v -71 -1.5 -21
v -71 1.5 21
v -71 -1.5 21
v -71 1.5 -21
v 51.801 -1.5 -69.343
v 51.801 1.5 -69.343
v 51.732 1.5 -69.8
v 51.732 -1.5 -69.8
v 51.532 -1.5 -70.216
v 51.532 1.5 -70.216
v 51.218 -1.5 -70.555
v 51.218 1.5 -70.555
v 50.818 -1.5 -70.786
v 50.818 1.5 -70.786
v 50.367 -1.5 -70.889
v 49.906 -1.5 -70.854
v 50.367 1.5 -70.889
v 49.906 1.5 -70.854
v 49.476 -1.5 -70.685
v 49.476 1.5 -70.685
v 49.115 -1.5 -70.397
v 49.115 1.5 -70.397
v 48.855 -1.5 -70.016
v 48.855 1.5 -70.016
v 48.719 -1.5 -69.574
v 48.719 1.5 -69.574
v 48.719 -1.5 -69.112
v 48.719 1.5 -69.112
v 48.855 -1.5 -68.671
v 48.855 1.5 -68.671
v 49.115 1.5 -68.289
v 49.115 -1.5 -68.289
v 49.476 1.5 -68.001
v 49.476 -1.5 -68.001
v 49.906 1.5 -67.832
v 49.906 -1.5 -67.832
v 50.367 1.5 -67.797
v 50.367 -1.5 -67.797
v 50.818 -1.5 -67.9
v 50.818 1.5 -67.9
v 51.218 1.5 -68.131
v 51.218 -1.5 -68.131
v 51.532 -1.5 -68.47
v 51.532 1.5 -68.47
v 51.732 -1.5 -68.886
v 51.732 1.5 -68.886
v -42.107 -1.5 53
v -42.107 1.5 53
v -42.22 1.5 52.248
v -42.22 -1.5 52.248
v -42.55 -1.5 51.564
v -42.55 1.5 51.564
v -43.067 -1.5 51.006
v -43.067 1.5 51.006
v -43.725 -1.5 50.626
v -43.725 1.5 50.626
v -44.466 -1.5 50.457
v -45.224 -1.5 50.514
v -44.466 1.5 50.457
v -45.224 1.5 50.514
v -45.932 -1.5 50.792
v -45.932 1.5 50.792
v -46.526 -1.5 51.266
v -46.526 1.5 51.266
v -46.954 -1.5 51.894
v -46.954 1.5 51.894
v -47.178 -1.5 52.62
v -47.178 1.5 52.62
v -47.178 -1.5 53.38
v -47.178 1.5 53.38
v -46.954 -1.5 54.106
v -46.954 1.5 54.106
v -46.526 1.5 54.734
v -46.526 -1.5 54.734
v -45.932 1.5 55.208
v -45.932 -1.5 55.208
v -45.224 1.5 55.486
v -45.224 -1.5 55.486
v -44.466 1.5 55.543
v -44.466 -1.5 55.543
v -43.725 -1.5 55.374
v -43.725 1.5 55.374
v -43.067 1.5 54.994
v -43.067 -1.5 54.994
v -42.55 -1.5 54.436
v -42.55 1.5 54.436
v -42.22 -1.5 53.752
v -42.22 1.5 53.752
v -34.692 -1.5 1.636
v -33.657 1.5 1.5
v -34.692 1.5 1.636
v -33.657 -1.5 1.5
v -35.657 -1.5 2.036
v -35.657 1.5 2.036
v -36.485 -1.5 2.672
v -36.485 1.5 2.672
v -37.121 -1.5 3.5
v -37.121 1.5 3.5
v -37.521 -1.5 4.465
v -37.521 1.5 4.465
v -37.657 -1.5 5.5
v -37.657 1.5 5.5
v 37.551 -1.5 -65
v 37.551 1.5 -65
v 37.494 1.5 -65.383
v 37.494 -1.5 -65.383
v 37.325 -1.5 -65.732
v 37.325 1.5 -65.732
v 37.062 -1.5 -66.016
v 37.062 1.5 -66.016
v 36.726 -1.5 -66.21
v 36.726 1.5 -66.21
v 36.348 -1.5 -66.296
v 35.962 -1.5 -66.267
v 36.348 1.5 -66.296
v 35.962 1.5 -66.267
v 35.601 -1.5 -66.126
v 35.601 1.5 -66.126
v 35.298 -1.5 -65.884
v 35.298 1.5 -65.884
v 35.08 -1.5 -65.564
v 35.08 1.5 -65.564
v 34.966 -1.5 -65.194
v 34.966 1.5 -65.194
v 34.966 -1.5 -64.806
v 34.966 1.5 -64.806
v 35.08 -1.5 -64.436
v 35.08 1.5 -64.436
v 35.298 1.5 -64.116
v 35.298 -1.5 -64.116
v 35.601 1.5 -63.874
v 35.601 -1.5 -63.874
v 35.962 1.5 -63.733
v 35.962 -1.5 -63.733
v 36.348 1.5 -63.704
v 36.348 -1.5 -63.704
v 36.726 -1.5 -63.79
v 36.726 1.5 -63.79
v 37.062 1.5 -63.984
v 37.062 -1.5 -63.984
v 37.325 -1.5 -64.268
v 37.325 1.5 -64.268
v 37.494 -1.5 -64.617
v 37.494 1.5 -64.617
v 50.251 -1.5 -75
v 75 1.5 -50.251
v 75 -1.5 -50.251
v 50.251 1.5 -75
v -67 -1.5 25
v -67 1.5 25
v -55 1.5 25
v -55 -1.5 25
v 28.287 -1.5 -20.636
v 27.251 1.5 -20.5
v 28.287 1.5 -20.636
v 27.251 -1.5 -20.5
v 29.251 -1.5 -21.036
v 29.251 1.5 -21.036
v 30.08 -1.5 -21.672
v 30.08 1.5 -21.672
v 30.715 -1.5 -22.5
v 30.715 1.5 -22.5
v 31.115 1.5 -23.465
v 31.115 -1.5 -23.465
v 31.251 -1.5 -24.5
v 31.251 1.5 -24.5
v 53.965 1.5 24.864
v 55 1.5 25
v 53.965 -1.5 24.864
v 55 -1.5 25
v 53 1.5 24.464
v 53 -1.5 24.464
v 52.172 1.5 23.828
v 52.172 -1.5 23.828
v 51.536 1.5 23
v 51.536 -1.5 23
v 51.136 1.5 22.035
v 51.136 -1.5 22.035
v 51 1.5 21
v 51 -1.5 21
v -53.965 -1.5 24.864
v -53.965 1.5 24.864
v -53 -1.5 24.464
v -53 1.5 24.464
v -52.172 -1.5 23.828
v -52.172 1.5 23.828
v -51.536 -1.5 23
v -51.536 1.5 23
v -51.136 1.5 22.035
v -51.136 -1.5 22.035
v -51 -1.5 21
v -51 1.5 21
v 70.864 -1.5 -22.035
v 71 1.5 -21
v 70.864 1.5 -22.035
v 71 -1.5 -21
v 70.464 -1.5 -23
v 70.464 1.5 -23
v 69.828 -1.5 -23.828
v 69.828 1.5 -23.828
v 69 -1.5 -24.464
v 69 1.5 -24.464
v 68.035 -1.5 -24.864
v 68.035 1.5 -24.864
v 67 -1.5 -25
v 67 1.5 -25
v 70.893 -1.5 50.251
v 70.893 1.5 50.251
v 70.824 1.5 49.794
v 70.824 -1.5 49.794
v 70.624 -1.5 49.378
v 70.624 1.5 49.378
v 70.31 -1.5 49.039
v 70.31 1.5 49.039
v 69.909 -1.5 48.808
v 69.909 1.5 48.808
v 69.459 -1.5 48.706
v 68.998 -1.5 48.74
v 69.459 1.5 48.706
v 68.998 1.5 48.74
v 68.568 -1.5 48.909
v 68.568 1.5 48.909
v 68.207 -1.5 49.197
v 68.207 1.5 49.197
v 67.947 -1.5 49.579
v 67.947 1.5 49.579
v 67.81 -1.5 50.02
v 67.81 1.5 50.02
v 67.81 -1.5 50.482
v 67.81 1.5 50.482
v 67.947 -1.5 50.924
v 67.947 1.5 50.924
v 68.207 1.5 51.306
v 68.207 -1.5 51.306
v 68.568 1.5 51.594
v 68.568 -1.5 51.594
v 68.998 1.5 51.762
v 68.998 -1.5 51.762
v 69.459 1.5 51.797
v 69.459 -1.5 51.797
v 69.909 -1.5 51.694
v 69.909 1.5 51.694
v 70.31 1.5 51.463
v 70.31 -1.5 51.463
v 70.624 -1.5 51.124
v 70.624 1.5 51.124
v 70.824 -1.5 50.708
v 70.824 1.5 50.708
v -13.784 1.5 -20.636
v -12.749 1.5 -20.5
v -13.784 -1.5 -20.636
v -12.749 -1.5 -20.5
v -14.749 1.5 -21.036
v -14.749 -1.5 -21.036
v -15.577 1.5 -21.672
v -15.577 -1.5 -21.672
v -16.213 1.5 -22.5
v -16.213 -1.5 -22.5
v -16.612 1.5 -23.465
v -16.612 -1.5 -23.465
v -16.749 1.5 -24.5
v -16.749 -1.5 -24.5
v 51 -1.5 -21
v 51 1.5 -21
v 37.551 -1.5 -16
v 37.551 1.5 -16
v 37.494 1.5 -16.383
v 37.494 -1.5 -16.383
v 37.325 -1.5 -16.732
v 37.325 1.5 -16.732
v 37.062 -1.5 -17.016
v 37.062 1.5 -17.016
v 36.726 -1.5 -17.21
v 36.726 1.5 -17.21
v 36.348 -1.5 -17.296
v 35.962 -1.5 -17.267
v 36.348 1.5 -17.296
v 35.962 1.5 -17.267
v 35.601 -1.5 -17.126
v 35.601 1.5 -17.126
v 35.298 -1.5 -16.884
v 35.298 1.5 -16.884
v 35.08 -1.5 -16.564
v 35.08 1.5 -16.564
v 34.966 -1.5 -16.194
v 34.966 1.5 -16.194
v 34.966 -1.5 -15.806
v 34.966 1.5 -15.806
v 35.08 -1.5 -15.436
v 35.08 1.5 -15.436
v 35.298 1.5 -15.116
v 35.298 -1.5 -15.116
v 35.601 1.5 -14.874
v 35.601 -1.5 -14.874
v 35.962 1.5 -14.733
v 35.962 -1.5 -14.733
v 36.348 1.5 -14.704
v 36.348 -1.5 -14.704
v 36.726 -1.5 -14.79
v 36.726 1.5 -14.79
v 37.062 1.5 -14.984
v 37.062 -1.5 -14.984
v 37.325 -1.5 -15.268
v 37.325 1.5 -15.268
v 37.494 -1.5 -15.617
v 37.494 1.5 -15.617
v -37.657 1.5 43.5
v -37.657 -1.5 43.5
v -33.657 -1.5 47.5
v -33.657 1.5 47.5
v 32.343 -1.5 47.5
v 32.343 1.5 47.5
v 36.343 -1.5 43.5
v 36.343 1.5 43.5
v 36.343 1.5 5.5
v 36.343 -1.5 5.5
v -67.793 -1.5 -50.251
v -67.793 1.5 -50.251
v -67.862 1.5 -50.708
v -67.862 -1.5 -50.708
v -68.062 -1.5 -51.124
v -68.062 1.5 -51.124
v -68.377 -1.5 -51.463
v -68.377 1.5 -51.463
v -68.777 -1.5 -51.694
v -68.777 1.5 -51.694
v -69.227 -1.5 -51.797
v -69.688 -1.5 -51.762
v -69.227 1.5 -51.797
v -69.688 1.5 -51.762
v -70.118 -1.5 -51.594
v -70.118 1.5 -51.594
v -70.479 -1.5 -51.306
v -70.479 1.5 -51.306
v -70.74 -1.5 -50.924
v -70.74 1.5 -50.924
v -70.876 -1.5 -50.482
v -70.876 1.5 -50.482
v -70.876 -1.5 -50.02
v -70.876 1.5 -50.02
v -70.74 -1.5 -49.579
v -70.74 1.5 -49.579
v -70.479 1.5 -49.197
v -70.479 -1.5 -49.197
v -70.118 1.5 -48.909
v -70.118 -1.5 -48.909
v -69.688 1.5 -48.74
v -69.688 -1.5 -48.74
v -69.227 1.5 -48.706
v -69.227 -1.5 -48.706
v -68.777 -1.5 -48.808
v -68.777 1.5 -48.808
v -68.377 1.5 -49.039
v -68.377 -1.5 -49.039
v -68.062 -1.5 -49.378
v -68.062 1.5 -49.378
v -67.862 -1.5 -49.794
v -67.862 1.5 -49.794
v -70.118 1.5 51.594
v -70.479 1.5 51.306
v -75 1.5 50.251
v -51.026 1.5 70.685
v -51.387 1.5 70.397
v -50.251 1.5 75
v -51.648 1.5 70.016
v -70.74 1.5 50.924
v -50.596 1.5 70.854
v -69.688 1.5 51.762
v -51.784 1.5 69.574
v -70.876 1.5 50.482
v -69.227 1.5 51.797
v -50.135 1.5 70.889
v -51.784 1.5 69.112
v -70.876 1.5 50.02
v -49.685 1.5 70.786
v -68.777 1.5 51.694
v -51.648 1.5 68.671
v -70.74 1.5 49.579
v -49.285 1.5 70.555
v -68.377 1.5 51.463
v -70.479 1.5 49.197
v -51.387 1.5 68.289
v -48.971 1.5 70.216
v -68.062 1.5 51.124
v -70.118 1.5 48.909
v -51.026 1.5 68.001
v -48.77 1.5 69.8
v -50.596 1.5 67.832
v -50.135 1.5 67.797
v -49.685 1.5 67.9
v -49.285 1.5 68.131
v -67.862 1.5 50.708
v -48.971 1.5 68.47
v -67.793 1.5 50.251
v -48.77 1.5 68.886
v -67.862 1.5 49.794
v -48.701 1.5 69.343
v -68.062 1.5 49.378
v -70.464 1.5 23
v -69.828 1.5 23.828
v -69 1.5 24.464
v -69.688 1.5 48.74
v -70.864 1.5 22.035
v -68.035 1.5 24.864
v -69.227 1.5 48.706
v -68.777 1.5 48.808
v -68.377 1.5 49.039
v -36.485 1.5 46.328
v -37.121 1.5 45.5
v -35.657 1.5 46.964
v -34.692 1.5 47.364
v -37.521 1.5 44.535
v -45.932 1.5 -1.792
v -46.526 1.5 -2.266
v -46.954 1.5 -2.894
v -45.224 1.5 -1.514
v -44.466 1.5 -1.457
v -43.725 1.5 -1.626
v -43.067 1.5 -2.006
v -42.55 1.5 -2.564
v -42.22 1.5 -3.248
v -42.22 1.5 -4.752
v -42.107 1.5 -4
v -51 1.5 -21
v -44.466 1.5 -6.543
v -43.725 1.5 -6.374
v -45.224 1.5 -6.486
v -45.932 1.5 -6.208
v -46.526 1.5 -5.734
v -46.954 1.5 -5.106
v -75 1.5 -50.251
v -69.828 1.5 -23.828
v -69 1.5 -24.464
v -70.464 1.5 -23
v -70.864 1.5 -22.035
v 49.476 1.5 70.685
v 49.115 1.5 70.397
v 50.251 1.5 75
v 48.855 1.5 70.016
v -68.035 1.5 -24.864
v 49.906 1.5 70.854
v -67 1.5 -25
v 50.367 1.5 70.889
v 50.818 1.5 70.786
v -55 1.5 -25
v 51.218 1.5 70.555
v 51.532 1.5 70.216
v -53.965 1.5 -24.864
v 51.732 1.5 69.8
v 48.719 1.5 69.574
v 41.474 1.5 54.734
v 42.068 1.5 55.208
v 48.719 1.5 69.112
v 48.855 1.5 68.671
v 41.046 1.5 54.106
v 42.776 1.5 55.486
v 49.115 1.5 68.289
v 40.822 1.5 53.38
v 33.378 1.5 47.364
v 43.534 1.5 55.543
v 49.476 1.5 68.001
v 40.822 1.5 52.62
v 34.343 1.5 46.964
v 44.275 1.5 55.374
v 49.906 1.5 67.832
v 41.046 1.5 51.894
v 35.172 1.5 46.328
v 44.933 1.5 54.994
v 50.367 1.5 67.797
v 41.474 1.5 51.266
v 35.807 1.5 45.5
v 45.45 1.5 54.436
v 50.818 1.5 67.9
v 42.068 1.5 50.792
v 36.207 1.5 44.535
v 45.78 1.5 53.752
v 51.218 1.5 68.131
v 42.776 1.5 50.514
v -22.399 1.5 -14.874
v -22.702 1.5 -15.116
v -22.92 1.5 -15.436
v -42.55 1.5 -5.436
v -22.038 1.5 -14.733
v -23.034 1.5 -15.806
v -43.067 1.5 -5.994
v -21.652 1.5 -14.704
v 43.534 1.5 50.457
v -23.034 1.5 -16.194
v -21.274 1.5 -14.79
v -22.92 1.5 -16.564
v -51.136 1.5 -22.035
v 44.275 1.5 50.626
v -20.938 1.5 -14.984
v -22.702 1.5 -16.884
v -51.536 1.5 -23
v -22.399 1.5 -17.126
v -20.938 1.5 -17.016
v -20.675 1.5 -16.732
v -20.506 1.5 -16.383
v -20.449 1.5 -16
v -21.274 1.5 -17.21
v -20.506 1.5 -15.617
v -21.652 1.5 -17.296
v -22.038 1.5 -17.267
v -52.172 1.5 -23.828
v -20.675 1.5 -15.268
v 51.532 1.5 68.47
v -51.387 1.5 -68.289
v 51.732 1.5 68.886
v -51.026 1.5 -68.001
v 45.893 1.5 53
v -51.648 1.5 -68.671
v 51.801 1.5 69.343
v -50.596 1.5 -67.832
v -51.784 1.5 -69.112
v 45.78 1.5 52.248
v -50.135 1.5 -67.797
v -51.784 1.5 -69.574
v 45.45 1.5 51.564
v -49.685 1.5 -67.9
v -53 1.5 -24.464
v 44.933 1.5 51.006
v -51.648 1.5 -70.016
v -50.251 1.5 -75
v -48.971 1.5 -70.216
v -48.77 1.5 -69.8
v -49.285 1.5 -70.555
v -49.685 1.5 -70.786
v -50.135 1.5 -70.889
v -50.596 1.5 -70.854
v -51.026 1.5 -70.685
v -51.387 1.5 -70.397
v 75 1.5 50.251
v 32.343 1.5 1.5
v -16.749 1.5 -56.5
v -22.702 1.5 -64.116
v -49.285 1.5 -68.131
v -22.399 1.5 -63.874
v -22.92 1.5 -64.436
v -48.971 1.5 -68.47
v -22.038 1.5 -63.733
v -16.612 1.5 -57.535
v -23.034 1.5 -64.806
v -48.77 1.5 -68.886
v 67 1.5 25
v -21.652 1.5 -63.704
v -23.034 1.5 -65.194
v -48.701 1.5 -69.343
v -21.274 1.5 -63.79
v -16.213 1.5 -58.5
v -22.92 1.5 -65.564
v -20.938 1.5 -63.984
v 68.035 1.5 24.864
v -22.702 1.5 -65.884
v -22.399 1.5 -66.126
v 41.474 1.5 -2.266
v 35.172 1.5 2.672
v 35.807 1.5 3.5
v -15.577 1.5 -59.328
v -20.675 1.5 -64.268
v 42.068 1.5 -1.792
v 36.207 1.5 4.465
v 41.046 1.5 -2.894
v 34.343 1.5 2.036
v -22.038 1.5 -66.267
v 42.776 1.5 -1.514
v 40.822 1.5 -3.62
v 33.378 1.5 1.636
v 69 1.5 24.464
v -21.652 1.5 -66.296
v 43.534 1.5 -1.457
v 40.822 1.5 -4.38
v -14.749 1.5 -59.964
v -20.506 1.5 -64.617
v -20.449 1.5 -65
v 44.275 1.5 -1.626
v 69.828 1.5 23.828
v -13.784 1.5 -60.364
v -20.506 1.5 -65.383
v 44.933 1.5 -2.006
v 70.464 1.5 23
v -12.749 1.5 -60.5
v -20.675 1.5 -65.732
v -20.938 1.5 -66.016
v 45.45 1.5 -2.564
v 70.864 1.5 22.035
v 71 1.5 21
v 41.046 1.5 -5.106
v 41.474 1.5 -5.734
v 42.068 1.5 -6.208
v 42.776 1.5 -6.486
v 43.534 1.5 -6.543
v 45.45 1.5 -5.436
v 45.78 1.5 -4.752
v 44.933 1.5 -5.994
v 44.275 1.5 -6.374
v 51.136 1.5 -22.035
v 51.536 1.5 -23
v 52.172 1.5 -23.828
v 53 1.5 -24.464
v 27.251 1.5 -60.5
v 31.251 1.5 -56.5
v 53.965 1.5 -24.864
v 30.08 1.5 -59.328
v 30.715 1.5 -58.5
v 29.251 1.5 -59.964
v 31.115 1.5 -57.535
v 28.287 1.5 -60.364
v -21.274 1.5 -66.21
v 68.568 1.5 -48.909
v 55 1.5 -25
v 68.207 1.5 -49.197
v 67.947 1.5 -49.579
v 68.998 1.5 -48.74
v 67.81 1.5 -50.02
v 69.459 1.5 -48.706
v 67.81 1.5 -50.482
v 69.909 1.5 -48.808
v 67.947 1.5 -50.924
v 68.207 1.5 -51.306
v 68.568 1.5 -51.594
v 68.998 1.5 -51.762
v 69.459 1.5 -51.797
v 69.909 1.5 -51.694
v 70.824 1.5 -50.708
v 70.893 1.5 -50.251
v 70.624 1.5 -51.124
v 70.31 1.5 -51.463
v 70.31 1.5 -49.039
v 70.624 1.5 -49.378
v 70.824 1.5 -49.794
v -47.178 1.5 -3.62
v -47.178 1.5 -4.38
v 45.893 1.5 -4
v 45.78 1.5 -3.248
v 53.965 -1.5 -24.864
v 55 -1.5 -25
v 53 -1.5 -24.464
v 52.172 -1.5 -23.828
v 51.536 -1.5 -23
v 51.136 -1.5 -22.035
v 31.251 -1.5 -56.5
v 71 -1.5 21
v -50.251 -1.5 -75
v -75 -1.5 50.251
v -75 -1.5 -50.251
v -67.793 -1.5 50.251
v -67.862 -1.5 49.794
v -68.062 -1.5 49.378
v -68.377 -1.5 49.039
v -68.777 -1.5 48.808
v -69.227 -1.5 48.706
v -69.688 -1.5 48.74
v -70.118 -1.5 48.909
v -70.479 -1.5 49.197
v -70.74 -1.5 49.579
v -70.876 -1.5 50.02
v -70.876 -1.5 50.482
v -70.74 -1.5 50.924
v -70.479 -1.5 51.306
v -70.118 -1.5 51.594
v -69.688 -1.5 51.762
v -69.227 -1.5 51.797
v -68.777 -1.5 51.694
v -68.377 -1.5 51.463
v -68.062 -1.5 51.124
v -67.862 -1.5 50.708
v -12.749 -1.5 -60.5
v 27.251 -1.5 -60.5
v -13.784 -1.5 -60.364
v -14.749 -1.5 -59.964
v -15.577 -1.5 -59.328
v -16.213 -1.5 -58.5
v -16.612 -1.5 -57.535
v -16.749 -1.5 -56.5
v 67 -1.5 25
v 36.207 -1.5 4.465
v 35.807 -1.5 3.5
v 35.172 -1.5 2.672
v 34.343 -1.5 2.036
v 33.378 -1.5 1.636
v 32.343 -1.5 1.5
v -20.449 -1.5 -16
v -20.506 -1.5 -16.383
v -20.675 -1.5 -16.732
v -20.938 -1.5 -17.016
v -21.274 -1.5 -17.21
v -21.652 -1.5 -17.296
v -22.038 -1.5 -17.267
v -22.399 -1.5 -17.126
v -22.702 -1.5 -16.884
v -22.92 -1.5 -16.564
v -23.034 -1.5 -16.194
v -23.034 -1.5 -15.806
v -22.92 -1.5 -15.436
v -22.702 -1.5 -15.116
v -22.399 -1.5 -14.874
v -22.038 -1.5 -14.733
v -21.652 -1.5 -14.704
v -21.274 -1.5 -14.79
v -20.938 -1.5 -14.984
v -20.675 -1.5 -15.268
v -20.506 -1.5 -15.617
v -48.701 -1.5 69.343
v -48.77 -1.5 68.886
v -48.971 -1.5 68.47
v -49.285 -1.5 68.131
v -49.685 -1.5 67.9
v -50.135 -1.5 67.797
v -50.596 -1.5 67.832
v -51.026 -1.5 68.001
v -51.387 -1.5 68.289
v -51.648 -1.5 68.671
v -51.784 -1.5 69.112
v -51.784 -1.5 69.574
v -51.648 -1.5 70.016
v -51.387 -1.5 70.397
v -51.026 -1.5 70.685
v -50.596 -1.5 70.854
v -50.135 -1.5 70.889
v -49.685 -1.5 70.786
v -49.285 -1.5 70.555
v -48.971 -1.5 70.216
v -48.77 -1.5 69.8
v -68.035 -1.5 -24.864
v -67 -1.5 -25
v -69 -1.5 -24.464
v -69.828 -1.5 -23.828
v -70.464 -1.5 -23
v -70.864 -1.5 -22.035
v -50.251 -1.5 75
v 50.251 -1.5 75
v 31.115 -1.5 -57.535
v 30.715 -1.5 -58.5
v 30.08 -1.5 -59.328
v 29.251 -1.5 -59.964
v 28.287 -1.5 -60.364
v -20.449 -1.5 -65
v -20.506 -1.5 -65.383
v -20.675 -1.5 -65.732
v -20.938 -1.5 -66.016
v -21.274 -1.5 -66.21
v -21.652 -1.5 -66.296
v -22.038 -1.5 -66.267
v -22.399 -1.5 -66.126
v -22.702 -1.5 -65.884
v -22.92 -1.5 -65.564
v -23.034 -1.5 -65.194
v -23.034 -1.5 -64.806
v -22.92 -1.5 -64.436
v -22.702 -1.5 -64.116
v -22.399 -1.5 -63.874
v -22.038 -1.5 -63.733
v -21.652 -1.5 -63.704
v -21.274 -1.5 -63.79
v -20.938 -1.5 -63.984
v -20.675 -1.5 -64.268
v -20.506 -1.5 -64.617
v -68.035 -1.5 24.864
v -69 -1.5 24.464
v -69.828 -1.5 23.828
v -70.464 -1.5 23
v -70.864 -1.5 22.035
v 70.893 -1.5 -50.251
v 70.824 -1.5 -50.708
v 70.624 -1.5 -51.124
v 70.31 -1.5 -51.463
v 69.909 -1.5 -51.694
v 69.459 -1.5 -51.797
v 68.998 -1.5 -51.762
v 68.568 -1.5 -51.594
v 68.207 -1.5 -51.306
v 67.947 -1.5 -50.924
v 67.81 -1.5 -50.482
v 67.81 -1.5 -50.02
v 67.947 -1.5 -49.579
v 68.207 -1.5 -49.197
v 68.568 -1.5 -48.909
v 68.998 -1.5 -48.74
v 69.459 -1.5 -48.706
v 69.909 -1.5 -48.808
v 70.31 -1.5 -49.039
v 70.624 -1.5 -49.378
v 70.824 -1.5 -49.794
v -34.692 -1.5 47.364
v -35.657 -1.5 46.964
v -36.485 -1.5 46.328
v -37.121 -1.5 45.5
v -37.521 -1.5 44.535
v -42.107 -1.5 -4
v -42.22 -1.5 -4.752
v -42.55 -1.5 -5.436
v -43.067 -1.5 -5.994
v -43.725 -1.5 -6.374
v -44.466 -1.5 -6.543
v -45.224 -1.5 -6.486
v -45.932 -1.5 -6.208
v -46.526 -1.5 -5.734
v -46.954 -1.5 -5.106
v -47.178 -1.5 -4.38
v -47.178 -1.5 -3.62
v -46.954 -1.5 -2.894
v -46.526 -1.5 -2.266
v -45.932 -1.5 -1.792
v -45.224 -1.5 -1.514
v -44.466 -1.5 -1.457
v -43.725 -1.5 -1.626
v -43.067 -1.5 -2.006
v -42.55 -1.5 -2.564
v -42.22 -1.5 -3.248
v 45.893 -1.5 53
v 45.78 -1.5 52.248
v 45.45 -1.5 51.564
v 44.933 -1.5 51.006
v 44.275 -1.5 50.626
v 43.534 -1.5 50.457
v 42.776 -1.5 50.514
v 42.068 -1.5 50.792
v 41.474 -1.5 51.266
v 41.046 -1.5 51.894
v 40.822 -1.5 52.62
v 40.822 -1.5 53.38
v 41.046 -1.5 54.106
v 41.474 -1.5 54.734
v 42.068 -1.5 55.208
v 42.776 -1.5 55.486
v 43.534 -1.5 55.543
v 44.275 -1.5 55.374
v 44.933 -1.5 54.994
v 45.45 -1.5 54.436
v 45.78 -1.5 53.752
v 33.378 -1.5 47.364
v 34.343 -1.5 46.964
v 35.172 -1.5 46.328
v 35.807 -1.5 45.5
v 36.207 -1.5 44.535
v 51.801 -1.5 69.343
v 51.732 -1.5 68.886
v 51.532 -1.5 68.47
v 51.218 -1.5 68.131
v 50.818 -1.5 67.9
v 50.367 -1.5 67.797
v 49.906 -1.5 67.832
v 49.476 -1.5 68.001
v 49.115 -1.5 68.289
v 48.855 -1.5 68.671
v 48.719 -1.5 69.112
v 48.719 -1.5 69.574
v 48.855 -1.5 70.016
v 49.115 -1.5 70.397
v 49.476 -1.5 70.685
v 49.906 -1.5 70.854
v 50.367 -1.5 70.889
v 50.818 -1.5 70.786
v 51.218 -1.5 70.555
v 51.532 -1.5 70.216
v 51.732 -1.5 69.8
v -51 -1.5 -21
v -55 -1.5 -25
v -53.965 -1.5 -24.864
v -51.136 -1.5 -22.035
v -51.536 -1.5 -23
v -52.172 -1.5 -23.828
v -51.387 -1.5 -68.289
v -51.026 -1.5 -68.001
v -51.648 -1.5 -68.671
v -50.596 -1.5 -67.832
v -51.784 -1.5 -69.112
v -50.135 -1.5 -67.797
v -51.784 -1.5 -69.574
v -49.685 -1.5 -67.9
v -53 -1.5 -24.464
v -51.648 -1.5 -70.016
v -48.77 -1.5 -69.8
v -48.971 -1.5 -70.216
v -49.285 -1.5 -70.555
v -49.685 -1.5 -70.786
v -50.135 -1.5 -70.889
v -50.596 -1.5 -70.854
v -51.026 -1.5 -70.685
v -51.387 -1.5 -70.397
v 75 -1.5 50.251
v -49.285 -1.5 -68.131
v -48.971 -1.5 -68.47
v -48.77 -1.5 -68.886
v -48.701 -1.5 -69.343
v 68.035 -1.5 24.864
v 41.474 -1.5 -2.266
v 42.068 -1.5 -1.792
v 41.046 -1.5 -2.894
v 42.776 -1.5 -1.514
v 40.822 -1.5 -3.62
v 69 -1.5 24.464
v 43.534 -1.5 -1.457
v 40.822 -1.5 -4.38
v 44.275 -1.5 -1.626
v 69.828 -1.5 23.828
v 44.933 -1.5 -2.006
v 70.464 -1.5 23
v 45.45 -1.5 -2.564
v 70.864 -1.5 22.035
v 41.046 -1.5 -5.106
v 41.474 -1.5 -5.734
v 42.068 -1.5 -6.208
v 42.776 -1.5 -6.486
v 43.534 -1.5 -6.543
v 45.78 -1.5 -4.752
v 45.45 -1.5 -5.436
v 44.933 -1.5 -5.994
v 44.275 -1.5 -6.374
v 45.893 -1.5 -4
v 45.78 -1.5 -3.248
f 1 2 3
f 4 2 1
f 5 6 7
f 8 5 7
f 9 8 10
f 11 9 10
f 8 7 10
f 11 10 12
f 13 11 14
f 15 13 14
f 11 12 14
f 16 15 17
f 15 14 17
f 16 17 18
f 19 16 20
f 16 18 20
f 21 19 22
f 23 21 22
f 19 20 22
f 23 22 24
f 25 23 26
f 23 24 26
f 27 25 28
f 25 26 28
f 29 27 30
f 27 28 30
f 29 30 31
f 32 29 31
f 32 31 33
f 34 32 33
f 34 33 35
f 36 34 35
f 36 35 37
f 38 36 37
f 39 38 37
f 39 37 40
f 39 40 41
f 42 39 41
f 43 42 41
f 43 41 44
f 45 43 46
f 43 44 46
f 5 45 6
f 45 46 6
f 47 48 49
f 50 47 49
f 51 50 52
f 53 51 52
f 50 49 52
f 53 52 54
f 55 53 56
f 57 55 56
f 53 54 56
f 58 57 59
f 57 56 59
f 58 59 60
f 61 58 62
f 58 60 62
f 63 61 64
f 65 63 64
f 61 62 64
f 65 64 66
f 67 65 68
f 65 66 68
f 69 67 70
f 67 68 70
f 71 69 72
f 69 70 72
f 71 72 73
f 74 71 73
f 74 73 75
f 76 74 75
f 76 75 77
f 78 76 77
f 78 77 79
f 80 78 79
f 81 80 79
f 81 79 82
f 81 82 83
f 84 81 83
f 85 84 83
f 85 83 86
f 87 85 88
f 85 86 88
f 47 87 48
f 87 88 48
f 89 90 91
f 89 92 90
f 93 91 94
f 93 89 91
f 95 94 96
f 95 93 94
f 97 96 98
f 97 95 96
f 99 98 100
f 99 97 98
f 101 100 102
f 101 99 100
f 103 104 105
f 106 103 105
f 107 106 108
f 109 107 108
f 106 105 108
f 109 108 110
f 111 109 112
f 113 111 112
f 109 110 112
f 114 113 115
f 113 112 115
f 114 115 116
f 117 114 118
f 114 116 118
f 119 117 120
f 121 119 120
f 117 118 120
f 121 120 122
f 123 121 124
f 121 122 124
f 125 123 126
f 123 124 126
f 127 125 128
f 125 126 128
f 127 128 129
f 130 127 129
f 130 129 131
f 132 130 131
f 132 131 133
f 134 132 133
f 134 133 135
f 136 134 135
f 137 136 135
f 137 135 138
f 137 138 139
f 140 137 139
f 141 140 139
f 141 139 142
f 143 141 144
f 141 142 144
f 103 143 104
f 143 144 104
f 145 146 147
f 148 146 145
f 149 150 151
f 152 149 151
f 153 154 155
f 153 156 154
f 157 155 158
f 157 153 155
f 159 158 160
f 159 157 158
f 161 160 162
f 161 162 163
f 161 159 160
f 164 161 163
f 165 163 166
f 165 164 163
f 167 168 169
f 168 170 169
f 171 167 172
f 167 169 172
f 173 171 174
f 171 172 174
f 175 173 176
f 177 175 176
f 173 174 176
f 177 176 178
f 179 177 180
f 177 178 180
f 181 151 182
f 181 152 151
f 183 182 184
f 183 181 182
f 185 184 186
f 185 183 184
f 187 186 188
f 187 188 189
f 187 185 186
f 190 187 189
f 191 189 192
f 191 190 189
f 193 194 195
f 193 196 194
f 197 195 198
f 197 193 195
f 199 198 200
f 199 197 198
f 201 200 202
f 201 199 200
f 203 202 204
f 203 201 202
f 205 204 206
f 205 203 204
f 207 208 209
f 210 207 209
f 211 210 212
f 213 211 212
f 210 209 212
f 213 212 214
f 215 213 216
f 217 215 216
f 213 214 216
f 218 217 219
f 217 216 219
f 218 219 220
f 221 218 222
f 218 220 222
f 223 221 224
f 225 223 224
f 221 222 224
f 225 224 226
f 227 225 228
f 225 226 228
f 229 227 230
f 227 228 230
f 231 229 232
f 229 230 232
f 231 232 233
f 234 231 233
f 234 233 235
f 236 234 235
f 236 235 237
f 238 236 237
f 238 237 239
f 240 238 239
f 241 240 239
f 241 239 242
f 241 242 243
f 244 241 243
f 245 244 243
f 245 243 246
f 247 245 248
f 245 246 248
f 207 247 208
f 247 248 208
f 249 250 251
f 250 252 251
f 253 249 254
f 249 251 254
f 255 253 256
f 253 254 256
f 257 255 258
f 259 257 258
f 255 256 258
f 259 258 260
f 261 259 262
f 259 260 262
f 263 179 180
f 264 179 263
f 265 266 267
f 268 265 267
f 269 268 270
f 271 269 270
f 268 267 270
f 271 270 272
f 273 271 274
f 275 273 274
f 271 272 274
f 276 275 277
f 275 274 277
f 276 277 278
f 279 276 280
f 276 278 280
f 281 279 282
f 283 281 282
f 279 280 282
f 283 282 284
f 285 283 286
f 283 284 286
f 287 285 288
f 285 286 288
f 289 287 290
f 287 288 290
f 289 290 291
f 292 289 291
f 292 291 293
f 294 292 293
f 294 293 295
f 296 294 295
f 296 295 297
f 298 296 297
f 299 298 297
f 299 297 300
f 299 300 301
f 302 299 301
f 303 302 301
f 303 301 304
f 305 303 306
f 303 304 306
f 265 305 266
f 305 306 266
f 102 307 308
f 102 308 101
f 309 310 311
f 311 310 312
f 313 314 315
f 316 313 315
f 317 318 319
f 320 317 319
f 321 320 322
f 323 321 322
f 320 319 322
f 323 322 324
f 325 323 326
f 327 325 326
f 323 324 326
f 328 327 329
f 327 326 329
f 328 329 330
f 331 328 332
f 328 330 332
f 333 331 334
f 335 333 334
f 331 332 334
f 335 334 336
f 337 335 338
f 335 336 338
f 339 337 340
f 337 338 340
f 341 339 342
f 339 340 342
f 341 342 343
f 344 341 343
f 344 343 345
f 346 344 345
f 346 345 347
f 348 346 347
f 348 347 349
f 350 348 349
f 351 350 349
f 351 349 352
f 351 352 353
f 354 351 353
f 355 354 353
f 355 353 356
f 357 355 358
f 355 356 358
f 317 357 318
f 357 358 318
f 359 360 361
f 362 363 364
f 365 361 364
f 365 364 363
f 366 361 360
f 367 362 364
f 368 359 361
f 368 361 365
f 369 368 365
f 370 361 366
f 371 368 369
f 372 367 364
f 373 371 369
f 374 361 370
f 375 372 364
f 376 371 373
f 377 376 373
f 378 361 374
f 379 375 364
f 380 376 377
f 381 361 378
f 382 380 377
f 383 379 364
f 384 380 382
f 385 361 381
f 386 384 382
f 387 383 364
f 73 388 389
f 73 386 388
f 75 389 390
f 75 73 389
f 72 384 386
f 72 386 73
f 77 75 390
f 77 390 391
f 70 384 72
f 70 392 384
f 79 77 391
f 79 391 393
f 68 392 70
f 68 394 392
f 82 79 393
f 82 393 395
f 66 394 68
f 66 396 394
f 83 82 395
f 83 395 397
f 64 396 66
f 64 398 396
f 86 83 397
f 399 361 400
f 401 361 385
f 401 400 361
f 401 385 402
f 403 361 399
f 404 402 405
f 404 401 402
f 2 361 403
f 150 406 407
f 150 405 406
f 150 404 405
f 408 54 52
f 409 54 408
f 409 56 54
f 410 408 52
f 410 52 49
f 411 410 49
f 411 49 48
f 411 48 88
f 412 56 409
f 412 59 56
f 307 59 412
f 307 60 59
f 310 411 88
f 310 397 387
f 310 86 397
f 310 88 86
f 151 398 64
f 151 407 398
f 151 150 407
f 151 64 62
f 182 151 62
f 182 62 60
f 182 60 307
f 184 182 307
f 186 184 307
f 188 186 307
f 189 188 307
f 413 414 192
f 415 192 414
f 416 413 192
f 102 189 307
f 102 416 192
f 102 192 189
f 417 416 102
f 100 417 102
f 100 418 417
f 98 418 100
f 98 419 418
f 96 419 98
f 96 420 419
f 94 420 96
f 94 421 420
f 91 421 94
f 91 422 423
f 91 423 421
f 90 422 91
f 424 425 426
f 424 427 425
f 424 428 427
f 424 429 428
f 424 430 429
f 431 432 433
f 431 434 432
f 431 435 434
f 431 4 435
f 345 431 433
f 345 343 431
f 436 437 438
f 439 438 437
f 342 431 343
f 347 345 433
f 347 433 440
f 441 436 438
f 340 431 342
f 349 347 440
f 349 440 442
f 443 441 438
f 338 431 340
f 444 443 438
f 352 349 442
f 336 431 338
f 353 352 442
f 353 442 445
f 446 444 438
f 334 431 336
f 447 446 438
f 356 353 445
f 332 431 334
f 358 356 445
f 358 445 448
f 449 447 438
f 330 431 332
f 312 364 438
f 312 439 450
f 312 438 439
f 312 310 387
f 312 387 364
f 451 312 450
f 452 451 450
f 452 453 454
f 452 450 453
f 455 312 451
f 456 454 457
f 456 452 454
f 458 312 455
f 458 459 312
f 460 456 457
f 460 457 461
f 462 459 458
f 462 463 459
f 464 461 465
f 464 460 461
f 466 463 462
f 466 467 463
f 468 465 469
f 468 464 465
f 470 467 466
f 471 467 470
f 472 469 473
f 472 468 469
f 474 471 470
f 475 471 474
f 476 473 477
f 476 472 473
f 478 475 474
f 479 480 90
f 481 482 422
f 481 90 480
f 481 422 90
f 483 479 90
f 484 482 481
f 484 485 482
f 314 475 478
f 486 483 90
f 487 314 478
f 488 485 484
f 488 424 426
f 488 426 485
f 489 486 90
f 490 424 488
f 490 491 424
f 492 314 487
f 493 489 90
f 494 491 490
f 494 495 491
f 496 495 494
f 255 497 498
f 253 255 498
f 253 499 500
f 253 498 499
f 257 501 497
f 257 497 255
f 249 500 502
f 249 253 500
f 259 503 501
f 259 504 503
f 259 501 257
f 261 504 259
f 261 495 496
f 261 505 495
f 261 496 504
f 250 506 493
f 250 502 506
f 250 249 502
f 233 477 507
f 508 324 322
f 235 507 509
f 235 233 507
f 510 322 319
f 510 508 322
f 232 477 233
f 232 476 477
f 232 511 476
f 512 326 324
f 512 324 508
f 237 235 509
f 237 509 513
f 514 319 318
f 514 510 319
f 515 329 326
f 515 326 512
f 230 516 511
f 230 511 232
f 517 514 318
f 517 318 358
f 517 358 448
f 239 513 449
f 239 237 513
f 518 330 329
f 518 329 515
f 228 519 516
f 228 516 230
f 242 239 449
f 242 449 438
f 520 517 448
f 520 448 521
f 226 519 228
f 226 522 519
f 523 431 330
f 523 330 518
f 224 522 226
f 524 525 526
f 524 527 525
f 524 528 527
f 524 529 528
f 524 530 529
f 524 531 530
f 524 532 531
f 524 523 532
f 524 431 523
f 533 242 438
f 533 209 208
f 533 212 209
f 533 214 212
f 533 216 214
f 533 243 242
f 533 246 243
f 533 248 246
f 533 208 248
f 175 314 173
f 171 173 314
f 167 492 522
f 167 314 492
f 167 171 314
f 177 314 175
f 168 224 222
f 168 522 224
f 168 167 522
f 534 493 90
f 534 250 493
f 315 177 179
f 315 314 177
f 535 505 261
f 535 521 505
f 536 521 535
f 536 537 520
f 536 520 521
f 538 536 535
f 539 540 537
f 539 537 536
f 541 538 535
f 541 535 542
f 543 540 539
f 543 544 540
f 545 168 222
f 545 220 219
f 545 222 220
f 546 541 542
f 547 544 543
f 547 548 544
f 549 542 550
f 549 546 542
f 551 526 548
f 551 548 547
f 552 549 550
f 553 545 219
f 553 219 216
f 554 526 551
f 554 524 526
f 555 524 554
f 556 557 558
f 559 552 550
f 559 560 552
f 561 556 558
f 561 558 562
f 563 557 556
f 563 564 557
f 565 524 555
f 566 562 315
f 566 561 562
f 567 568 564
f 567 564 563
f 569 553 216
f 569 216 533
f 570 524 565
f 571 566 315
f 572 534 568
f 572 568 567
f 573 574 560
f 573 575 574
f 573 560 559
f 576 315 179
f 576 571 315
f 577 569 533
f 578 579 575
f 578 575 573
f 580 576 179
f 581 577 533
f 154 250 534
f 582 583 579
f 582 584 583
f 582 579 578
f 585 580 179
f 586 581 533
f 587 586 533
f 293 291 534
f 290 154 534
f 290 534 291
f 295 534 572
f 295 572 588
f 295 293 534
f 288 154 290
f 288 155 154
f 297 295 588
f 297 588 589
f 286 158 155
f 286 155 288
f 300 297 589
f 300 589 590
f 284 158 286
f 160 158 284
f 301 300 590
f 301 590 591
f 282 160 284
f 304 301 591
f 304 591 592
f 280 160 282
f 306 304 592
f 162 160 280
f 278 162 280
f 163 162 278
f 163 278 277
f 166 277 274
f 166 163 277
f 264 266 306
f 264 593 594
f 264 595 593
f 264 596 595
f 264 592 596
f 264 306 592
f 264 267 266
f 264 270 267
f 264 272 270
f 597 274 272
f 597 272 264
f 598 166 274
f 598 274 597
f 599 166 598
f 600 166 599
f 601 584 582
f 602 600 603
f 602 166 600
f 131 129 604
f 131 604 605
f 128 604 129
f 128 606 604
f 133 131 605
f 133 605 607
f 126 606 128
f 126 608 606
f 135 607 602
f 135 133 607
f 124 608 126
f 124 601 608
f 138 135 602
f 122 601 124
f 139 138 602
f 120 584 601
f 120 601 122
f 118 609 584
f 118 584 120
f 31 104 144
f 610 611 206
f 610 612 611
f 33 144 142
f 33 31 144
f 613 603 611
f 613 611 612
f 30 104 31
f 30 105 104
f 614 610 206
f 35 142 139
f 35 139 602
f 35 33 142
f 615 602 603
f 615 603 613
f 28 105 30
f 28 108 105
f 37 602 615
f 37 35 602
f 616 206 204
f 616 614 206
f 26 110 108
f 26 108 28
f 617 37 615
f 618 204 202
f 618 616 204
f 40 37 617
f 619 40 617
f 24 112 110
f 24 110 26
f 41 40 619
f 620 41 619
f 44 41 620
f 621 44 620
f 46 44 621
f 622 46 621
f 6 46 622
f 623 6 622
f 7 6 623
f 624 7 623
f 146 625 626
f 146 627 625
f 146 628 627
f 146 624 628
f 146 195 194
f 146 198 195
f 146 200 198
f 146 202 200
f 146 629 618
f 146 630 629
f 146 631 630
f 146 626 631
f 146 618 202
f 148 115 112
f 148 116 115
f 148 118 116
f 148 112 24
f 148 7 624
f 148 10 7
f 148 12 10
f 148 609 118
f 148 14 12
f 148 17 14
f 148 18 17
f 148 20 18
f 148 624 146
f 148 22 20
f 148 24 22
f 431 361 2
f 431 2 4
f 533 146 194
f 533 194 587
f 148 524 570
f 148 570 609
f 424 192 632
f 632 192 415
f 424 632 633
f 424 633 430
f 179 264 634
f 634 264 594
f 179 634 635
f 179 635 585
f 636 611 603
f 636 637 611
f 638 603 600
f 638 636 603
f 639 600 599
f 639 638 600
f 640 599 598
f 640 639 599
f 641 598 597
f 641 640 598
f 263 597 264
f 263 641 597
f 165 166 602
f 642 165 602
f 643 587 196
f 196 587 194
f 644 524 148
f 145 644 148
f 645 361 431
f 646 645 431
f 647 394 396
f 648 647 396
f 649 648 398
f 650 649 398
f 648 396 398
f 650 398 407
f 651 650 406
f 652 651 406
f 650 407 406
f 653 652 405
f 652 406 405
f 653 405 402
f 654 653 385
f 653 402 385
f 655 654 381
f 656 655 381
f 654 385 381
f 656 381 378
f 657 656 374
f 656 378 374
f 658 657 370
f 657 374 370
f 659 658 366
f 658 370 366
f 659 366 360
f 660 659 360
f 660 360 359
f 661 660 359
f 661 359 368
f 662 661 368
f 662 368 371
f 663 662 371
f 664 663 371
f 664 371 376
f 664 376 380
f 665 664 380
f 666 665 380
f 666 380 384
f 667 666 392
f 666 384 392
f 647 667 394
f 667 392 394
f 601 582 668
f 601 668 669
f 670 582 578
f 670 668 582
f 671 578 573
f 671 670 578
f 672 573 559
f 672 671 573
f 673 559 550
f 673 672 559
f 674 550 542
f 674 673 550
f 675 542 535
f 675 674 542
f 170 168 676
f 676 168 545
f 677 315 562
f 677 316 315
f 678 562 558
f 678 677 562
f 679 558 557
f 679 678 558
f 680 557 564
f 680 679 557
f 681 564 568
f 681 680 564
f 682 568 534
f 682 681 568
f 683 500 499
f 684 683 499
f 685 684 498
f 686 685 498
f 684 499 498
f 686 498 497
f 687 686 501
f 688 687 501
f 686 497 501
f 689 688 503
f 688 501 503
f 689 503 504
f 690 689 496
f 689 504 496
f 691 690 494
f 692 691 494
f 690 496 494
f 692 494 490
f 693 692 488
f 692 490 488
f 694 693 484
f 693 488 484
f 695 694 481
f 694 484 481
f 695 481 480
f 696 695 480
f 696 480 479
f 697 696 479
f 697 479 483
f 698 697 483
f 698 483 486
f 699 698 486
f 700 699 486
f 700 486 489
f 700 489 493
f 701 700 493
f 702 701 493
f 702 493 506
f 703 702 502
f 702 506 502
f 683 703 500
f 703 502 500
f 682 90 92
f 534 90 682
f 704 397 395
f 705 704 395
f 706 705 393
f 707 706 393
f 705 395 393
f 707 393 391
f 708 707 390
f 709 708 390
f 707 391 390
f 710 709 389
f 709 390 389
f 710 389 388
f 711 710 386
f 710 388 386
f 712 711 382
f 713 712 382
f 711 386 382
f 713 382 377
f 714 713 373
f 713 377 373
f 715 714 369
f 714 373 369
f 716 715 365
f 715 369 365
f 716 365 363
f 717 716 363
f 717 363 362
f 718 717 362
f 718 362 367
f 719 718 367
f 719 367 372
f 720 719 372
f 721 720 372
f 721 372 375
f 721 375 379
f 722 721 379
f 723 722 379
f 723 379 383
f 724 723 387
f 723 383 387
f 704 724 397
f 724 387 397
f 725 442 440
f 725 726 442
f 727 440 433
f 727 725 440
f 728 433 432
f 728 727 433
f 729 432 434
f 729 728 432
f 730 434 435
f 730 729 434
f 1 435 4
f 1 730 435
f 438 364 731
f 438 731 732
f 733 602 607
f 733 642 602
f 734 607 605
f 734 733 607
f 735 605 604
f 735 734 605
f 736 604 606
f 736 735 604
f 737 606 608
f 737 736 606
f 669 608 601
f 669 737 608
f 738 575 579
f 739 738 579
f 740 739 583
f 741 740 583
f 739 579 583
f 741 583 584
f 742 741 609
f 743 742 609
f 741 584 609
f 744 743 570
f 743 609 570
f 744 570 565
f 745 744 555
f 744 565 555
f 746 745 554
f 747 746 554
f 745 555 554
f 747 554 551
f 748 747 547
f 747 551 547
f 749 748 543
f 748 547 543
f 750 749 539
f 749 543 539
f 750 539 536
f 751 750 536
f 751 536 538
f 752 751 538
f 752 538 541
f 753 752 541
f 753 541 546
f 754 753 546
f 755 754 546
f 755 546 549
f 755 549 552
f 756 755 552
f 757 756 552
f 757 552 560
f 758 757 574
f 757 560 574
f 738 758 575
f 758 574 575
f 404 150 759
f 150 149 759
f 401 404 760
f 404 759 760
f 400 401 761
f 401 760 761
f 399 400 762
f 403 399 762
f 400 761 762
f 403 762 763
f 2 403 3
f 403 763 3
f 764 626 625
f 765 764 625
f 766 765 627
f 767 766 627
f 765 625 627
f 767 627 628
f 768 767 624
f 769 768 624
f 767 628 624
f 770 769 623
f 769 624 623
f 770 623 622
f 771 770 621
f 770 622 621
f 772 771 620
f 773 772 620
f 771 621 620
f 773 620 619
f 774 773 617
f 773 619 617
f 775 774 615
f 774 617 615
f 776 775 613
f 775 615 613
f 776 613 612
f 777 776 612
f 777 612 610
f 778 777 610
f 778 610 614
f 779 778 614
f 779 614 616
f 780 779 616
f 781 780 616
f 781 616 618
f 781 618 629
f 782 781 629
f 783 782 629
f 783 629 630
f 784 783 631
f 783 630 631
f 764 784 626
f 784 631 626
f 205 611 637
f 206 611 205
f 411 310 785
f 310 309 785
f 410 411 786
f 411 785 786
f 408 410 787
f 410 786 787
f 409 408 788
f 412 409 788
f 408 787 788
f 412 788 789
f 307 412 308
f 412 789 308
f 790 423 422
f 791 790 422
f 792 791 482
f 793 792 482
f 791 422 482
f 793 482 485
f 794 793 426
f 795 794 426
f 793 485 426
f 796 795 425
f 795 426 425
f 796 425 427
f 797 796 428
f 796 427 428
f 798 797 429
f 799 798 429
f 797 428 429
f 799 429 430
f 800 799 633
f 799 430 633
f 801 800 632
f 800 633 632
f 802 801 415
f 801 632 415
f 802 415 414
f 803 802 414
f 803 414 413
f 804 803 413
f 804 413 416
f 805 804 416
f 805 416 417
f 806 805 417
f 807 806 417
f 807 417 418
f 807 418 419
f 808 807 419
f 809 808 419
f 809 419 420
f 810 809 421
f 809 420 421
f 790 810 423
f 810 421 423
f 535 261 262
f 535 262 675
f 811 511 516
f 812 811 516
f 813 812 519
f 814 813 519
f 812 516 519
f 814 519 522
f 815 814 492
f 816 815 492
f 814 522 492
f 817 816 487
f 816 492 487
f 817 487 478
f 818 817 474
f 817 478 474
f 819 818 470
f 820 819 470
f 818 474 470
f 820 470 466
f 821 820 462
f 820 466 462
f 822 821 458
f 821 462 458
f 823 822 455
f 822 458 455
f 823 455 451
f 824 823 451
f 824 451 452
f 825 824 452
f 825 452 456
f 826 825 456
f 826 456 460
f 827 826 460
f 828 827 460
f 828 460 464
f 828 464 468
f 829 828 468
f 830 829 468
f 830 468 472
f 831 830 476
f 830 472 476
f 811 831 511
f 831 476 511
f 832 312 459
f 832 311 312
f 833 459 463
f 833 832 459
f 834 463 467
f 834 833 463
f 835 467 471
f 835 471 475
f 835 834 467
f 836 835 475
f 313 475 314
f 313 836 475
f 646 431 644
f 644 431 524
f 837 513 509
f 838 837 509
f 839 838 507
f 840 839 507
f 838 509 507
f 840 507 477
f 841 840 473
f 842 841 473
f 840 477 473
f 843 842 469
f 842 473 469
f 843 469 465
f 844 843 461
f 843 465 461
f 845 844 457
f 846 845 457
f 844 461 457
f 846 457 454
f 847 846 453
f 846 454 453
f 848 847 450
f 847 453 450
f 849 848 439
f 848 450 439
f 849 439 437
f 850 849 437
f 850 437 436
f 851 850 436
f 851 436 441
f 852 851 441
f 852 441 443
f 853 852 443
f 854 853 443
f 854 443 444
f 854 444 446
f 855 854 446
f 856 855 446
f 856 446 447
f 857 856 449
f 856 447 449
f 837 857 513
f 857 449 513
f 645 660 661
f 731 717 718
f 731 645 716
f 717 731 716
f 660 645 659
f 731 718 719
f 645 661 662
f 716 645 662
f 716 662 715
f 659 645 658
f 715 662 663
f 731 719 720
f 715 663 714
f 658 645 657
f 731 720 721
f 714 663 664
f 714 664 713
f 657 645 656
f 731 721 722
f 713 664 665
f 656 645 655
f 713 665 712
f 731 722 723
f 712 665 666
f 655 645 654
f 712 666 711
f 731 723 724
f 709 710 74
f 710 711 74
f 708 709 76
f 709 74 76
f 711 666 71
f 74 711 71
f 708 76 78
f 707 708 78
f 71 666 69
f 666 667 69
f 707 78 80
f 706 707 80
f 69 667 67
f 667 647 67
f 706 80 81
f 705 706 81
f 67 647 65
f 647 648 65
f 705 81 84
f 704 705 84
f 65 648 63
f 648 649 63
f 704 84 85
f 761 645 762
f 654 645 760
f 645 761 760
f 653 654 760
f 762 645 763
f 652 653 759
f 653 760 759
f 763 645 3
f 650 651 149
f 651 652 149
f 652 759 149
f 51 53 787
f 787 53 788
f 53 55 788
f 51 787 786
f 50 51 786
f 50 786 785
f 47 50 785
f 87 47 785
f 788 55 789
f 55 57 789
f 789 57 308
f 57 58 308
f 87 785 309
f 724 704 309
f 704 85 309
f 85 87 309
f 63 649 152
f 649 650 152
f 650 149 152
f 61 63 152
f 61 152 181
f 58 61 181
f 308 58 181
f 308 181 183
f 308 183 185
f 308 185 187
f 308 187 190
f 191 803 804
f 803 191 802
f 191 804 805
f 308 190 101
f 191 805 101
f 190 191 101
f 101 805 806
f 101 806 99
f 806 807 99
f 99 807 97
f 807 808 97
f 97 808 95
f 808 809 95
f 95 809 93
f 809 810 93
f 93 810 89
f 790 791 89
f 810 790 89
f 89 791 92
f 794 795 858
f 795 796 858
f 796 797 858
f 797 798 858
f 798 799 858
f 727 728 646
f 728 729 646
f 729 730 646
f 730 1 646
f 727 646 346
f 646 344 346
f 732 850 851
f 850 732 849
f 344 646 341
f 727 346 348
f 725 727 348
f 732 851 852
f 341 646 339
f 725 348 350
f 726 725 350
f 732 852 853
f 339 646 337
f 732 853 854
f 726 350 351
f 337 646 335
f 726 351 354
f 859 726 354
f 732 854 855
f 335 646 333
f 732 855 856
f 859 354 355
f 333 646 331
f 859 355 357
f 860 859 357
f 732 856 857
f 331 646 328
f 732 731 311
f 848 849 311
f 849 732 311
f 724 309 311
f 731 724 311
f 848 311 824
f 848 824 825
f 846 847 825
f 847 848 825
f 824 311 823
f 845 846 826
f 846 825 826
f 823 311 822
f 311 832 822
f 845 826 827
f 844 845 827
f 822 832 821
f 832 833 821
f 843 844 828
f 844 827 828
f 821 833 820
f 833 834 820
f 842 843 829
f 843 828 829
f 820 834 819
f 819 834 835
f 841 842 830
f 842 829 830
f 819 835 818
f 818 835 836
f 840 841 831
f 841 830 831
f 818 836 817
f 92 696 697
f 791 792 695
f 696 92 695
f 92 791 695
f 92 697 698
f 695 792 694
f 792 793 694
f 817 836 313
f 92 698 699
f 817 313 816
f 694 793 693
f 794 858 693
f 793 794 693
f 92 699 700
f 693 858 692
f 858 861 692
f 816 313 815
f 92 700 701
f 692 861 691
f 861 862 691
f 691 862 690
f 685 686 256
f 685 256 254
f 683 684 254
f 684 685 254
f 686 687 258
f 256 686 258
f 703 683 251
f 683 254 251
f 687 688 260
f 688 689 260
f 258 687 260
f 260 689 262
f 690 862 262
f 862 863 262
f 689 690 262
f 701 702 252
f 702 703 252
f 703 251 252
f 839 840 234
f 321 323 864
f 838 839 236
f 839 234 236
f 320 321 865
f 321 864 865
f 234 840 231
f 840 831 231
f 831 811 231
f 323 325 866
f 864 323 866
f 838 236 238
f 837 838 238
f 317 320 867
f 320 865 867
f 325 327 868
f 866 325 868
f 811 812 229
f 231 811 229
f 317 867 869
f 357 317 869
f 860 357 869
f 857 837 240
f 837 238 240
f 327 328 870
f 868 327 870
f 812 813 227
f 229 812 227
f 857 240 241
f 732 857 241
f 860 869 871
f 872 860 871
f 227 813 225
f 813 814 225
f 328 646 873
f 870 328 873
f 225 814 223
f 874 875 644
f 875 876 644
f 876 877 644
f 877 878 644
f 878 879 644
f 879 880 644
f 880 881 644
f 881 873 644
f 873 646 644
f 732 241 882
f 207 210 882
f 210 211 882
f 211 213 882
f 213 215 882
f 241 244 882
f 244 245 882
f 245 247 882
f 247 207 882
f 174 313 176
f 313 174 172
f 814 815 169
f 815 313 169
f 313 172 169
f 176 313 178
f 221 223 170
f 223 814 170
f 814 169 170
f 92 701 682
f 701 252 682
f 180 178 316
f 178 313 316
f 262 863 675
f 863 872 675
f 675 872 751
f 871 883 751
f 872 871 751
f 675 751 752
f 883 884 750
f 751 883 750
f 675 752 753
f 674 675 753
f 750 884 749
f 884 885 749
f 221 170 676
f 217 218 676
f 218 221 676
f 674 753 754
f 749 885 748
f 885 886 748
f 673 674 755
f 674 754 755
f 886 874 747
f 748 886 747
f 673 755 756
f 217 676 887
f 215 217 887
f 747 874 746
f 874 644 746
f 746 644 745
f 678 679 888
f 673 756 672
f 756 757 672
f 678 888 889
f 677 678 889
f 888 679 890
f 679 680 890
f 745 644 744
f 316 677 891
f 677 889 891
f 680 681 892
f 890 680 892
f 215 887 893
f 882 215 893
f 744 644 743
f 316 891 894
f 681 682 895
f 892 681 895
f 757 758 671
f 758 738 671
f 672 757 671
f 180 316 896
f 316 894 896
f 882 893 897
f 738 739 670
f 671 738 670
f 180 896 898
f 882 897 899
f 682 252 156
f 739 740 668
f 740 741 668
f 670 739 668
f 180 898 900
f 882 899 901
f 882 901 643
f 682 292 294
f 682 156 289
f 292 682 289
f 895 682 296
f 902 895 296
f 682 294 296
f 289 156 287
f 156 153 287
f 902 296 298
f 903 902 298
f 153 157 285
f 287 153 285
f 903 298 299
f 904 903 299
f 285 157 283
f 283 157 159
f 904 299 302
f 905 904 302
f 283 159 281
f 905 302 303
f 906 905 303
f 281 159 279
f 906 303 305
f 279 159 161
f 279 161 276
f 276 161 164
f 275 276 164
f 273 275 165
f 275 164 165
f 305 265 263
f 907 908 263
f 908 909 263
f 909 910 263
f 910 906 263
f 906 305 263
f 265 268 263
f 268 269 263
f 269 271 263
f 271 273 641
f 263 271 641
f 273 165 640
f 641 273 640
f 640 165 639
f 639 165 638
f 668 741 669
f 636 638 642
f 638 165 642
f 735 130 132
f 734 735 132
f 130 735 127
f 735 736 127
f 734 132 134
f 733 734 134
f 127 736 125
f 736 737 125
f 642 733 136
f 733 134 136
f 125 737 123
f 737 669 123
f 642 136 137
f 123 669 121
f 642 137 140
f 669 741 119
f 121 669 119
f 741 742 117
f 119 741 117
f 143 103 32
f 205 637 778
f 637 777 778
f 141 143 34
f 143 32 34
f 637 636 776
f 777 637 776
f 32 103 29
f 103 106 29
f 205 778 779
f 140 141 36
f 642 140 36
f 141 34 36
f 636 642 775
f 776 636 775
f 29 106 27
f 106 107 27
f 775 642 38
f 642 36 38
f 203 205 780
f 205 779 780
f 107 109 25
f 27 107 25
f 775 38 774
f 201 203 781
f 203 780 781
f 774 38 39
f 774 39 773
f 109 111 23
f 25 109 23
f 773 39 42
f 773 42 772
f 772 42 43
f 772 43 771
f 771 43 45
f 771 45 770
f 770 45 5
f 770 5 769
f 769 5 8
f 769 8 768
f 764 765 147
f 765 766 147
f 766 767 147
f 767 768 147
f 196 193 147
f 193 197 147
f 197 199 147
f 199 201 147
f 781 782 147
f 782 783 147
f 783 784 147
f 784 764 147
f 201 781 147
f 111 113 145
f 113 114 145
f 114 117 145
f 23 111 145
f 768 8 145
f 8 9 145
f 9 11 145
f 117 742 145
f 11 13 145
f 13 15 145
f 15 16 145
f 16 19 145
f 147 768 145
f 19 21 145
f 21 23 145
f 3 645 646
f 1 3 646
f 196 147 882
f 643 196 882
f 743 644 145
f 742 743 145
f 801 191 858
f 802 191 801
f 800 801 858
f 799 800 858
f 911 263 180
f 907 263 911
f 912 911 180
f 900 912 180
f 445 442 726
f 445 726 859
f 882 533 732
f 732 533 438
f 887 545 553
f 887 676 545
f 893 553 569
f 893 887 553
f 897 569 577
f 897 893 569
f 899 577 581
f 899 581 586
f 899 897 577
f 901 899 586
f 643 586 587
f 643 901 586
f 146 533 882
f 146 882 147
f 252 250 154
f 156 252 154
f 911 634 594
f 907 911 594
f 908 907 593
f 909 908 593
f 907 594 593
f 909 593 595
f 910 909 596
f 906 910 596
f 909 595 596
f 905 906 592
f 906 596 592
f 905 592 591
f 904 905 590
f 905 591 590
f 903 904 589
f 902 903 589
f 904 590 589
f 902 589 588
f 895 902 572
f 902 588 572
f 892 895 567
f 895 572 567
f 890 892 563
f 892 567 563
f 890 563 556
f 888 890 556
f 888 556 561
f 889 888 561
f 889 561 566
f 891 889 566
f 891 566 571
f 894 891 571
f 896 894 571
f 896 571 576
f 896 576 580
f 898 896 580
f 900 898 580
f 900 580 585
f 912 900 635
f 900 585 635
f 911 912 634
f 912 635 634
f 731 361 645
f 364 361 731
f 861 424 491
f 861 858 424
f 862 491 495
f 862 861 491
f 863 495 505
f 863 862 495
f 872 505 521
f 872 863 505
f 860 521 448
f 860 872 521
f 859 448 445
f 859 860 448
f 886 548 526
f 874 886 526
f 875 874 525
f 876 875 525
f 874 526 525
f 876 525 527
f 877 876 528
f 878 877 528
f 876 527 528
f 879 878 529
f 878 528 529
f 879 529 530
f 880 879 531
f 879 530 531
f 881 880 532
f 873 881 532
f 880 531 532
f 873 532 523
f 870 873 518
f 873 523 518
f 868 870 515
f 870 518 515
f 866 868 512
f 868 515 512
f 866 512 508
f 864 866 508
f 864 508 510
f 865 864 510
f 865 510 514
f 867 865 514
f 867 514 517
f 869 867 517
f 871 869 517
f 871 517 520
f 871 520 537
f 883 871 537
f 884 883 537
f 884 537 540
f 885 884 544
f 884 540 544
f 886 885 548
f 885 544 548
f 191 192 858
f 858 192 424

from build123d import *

# Parameters (mm, degrees)
SKETCH1_W           = 150
SKETCH1_H           = 150
BOSS_EXTRUDE1_DEPTH = 1.5
CUT_EXTRUDE1_DEPTH  = 3
SKETCH3_R           = 1.55
CUT_EXTRUDE2_DEPTH  = 3
SKETCH6_R           = 1.3
SKETCH6_R_2         = 2.55
CUT_EXTRUDE9_DEPTH  = 3
SKETCH7_W           = 20
SKETCH7_H           = 50
SKETCH7_W_2         = 48
SKETCH7_H_2         = 40
SKETCH7_W_3         = 74
SKETCH7_H_3         = 46
CUT_EXTRUDE10_DEPTH = 3
FILLET1_R           = 4


with BuildPart() as part:
    # Sketch1 → Boss-Extrude1 (new body, symmetric)
    with BuildSketch(Plane(origin=(0, 0, 0), x_dir=(1, 0, 0), z_dir=(0, 1, 0))):
        Rectangle(SKETCH1_W, SKETCH1_H)
    extrude(amount=BOSS_EXTRUDE1_DEPTH, both=True)

    # Sketch2 → Cut-Extrude1 (cut)
    with BuildSketch(Plane(origin=(0, 1.5, 0), x_dir=(1, 0, 0), z_dir=(0, 1, 0))):
        Polygon((50.251262658, 75), (75, 75), (75, 50.251262658), align=None)
        Polygon((-75, 75), (-75, 50.251262658), (-50.251262658, 75), align=None)
        Polygon((-50.251262658, -75), (-75, -75), (-75, -50.251262658), align=None)
        Polygon((75, -75), (75, -50.251262658), (50.251262658, -75), align=None)
    extrude(amount=-CUT_EXTRUDE1_DEPTH, mode=Mode.SUBTRACT)

    # Sketch3 → Cut-Extrude2 (cut)
    with BuildSketch(Plane(origin=(0, 1.5, 0), x_dir=(1, 0, 0), z_dir=(0, 1, 0))):
        with Locations((69.343145751, 50.251262658)):
            Circle(SKETCH3_R)
        with Locations((50.251262658, 69.343145751)):
            Circle(SKETCH3_R)
        with Locations((-69.343145751, 50.251262658)):
            Circle(SKETCH3_R)
        with Locations((-50.251262658, 69.343145751)):
            Circle(SKETCH3_R)
        with Locations((-69.343145751, -50.251262658)):
            Circle(SKETCH3_R)
        with Locations((-50.251262658, -69.343145751)):
            Circle(SKETCH3_R)
        with Locations((69.343145751, -50.251262658)):
            Circle(SKETCH3_R)
        with Locations((50.251262658, -69.343145751)):
            Circle(SKETCH3_R)
    extrude(amount=-CUT_EXTRUDE2_DEPTH, mode=Mode.SUBTRACT)

    # Sketch6 → Cut-Extrude9 (cut)
    with BuildSketch(Plane(origin=(0, 1.5, 0), x_dir=(1, 0, 0), z_dir=(0, 1, 0))):
        with Locations((36.251262658, 16)):
            Circle(SKETCH6_R)
        with Locations((-21.748737342, 16)):
            Circle(SKETCH6_R)
        with Locations((36.251262658, 65)):
            Circle(SKETCH6_R)
        with Locations((-21.748737342, 65)):
            Circle(SKETCH6_R)
        with Locations((-44.656854249, 4)):
            Circle(SKETCH6_R_2)
        with Locations((-44.656854249, -53)):
            Circle(SKETCH6_R_2)
        with Locations((43.343145751, 4)):
            Circle(SKETCH6_R_2)
        with Locations((43.343145751, -53)):
            Circle(SKETCH6_R_2)
    extrude(amount=-CUT_EXTRUDE9_DEPTH, mode=Mode.SUBTRACT)

    # Sketch7 → Cut-Extrude10 (cut)
    with BuildSketch(Plane(origin=(0, 1.5, 0), x_dir=(1, 0, 0), z_dir=(0, 1, 0))):
        with Locations((61, 0)):
            Rectangle(SKETCH7_W, SKETCH7_H)
        with Locations((-61, 0)):
            Rectangle(SKETCH7_W, SKETCH7_H)
        with Locations((7.251262658, 40.5)):
            Rectangle(SKETCH7_W_2, SKETCH7_H_2)
        with Locations((-0.656854249, -24.5)):
            Rectangle(SKETCH7_W_3, SKETCH7_H_3)
    extrude(amount=-CUT_EXTRUDE10_DEPTH, mode=Mode.SUBTRACT)

    # Fillet1
    fillet1_edges = [part.edges().sort_by_distance(p)[0] for p in [
        (51, 0, 25),
        (51, 0, -25),
        (71, 0, -25),
        (71, 0, 25),
        (36.343145751, 0, 1.5),
        (36.343145751, 0, 47.5),
        (-37.656854249, 0, 47.5),
        (-37.656854249, 0, 1.5),
        (31.251262658, 0, -60.5),
        (31.251262658, 0, -20.5),
        (-16.748737342, 0, -20.5),
        (-16.748737342, 0, -60.5),
        (-71, 0, 25),
        (-71, 0, -25),
        (-51, 0, -25),
        (-51, 0, 25),
    ]]
    fillet(fillet1_edges, radius=FILLET1_R)


solid = part.part
